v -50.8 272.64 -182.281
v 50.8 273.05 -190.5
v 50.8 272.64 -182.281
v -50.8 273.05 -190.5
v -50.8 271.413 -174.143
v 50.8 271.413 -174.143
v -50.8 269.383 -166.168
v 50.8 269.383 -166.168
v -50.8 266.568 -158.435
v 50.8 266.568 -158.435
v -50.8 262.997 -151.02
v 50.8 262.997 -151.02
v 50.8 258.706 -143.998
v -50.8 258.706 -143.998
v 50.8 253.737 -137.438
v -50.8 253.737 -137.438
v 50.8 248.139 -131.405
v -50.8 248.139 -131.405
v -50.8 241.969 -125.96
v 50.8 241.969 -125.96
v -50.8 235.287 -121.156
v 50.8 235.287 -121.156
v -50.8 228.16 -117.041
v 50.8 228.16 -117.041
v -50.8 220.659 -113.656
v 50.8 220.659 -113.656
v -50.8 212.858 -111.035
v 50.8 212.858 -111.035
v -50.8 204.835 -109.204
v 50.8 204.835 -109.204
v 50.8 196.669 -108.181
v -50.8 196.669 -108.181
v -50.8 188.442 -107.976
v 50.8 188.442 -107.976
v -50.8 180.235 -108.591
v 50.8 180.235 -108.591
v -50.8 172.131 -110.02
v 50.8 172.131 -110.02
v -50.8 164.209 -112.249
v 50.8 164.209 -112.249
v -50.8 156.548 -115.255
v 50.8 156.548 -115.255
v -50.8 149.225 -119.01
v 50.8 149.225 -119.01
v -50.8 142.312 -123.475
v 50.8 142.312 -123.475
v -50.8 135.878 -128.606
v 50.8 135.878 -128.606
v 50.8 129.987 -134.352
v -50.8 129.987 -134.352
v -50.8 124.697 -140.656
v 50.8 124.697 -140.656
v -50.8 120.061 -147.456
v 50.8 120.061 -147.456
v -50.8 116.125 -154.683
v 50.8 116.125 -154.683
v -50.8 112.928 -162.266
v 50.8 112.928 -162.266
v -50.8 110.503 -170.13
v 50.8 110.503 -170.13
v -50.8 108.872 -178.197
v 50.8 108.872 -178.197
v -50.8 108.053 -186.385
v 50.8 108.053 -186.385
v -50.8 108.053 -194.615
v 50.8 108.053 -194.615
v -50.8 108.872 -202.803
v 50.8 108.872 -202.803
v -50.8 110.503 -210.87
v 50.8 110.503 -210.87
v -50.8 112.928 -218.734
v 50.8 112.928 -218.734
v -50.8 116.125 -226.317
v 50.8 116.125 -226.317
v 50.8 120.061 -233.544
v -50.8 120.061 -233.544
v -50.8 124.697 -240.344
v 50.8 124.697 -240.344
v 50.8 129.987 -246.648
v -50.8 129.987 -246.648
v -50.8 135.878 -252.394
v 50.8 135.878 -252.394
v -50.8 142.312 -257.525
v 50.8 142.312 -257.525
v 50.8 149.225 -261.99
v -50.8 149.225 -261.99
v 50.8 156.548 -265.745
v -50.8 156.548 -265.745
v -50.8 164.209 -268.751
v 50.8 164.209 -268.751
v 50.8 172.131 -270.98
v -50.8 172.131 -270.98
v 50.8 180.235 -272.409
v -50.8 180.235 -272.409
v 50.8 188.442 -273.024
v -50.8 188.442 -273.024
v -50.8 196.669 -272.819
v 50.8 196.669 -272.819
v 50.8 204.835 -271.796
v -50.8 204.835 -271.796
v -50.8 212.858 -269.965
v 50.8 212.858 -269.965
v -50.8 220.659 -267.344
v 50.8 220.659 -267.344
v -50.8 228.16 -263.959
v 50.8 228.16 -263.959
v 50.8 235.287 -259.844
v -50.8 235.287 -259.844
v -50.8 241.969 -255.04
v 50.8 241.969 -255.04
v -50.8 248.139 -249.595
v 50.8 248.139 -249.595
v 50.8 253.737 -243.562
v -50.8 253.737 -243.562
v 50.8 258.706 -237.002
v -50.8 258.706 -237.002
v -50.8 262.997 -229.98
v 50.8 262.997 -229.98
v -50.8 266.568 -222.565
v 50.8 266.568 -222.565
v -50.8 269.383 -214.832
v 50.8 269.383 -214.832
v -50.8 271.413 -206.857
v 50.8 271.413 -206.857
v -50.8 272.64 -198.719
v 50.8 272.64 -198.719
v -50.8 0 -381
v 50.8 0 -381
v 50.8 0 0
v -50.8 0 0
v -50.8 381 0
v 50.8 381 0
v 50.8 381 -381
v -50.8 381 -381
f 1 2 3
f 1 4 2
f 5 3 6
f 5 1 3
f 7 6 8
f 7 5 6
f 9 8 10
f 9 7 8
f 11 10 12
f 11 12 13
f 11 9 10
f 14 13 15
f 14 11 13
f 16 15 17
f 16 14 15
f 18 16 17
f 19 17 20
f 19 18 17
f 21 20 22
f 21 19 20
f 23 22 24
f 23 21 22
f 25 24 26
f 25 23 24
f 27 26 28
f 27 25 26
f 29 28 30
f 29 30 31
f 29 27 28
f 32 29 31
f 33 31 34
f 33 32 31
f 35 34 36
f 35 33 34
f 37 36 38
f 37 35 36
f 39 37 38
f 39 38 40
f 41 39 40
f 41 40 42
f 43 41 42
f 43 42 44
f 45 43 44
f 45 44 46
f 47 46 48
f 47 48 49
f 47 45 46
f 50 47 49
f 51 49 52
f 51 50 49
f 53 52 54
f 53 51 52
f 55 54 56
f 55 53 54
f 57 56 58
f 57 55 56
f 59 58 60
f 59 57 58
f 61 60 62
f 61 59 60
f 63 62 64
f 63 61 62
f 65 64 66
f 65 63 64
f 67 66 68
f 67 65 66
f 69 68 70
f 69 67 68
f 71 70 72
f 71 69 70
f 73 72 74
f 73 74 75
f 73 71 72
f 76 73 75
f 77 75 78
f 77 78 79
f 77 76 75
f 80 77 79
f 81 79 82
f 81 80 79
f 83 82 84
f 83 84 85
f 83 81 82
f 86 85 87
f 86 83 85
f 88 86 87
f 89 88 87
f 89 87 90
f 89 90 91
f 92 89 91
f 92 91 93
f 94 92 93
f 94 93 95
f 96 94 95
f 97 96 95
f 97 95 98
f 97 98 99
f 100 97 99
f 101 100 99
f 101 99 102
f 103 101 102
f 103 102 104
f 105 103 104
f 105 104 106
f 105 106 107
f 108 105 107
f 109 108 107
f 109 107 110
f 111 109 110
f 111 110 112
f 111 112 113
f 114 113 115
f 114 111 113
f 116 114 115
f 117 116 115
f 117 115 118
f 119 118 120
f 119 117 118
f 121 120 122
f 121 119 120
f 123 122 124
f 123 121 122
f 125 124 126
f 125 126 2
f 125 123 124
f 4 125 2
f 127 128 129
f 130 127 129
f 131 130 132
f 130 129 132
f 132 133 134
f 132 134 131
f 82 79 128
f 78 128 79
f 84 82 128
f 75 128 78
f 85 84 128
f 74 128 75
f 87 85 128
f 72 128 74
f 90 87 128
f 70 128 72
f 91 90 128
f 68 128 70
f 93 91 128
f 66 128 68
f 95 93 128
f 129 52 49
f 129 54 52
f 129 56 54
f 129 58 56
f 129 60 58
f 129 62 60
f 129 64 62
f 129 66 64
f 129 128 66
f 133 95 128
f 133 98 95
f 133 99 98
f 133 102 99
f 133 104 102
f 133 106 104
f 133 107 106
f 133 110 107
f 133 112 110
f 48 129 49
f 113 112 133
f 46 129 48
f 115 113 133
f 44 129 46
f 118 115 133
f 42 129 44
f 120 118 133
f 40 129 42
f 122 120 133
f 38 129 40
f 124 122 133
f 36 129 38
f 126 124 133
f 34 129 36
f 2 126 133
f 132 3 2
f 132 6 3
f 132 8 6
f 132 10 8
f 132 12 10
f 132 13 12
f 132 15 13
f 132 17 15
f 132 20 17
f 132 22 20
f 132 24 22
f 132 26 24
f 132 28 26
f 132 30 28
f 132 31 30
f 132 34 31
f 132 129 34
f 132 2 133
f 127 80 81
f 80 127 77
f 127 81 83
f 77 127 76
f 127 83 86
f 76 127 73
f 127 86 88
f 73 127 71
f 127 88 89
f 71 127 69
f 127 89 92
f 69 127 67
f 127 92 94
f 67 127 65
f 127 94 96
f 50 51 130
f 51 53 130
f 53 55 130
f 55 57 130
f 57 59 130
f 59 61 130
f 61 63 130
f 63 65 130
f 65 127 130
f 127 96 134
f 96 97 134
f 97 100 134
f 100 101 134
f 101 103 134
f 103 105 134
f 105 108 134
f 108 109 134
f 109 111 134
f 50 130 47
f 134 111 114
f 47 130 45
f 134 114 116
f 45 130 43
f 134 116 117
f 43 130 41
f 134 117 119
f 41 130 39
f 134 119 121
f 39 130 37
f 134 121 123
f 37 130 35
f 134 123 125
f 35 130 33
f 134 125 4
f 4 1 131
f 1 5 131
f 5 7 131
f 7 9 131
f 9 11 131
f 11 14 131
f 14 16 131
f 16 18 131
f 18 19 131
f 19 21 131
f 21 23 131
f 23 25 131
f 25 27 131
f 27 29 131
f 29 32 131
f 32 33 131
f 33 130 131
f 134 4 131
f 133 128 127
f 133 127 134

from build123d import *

# Parameters (mm, degrees)
F0_W     = 381
F0_H     = 381
F0_R     = 82.55
F1_DEPTH = 50.8


with BuildPart() as f1:
    # F0 (on Right) → F1 (new body, symmetric)
    with BuildSketch(Plane.YZ):
        with Locations((190.5, -190.5)):
            Rectangle(F0_W, F0_H)
        with Locations((190.5, -190.5)):
            Circle(F0_R, mode=Mode.SUBTRACT)
    extrude(amount=F1_DEPTH, both=True)


solid = f1.part
